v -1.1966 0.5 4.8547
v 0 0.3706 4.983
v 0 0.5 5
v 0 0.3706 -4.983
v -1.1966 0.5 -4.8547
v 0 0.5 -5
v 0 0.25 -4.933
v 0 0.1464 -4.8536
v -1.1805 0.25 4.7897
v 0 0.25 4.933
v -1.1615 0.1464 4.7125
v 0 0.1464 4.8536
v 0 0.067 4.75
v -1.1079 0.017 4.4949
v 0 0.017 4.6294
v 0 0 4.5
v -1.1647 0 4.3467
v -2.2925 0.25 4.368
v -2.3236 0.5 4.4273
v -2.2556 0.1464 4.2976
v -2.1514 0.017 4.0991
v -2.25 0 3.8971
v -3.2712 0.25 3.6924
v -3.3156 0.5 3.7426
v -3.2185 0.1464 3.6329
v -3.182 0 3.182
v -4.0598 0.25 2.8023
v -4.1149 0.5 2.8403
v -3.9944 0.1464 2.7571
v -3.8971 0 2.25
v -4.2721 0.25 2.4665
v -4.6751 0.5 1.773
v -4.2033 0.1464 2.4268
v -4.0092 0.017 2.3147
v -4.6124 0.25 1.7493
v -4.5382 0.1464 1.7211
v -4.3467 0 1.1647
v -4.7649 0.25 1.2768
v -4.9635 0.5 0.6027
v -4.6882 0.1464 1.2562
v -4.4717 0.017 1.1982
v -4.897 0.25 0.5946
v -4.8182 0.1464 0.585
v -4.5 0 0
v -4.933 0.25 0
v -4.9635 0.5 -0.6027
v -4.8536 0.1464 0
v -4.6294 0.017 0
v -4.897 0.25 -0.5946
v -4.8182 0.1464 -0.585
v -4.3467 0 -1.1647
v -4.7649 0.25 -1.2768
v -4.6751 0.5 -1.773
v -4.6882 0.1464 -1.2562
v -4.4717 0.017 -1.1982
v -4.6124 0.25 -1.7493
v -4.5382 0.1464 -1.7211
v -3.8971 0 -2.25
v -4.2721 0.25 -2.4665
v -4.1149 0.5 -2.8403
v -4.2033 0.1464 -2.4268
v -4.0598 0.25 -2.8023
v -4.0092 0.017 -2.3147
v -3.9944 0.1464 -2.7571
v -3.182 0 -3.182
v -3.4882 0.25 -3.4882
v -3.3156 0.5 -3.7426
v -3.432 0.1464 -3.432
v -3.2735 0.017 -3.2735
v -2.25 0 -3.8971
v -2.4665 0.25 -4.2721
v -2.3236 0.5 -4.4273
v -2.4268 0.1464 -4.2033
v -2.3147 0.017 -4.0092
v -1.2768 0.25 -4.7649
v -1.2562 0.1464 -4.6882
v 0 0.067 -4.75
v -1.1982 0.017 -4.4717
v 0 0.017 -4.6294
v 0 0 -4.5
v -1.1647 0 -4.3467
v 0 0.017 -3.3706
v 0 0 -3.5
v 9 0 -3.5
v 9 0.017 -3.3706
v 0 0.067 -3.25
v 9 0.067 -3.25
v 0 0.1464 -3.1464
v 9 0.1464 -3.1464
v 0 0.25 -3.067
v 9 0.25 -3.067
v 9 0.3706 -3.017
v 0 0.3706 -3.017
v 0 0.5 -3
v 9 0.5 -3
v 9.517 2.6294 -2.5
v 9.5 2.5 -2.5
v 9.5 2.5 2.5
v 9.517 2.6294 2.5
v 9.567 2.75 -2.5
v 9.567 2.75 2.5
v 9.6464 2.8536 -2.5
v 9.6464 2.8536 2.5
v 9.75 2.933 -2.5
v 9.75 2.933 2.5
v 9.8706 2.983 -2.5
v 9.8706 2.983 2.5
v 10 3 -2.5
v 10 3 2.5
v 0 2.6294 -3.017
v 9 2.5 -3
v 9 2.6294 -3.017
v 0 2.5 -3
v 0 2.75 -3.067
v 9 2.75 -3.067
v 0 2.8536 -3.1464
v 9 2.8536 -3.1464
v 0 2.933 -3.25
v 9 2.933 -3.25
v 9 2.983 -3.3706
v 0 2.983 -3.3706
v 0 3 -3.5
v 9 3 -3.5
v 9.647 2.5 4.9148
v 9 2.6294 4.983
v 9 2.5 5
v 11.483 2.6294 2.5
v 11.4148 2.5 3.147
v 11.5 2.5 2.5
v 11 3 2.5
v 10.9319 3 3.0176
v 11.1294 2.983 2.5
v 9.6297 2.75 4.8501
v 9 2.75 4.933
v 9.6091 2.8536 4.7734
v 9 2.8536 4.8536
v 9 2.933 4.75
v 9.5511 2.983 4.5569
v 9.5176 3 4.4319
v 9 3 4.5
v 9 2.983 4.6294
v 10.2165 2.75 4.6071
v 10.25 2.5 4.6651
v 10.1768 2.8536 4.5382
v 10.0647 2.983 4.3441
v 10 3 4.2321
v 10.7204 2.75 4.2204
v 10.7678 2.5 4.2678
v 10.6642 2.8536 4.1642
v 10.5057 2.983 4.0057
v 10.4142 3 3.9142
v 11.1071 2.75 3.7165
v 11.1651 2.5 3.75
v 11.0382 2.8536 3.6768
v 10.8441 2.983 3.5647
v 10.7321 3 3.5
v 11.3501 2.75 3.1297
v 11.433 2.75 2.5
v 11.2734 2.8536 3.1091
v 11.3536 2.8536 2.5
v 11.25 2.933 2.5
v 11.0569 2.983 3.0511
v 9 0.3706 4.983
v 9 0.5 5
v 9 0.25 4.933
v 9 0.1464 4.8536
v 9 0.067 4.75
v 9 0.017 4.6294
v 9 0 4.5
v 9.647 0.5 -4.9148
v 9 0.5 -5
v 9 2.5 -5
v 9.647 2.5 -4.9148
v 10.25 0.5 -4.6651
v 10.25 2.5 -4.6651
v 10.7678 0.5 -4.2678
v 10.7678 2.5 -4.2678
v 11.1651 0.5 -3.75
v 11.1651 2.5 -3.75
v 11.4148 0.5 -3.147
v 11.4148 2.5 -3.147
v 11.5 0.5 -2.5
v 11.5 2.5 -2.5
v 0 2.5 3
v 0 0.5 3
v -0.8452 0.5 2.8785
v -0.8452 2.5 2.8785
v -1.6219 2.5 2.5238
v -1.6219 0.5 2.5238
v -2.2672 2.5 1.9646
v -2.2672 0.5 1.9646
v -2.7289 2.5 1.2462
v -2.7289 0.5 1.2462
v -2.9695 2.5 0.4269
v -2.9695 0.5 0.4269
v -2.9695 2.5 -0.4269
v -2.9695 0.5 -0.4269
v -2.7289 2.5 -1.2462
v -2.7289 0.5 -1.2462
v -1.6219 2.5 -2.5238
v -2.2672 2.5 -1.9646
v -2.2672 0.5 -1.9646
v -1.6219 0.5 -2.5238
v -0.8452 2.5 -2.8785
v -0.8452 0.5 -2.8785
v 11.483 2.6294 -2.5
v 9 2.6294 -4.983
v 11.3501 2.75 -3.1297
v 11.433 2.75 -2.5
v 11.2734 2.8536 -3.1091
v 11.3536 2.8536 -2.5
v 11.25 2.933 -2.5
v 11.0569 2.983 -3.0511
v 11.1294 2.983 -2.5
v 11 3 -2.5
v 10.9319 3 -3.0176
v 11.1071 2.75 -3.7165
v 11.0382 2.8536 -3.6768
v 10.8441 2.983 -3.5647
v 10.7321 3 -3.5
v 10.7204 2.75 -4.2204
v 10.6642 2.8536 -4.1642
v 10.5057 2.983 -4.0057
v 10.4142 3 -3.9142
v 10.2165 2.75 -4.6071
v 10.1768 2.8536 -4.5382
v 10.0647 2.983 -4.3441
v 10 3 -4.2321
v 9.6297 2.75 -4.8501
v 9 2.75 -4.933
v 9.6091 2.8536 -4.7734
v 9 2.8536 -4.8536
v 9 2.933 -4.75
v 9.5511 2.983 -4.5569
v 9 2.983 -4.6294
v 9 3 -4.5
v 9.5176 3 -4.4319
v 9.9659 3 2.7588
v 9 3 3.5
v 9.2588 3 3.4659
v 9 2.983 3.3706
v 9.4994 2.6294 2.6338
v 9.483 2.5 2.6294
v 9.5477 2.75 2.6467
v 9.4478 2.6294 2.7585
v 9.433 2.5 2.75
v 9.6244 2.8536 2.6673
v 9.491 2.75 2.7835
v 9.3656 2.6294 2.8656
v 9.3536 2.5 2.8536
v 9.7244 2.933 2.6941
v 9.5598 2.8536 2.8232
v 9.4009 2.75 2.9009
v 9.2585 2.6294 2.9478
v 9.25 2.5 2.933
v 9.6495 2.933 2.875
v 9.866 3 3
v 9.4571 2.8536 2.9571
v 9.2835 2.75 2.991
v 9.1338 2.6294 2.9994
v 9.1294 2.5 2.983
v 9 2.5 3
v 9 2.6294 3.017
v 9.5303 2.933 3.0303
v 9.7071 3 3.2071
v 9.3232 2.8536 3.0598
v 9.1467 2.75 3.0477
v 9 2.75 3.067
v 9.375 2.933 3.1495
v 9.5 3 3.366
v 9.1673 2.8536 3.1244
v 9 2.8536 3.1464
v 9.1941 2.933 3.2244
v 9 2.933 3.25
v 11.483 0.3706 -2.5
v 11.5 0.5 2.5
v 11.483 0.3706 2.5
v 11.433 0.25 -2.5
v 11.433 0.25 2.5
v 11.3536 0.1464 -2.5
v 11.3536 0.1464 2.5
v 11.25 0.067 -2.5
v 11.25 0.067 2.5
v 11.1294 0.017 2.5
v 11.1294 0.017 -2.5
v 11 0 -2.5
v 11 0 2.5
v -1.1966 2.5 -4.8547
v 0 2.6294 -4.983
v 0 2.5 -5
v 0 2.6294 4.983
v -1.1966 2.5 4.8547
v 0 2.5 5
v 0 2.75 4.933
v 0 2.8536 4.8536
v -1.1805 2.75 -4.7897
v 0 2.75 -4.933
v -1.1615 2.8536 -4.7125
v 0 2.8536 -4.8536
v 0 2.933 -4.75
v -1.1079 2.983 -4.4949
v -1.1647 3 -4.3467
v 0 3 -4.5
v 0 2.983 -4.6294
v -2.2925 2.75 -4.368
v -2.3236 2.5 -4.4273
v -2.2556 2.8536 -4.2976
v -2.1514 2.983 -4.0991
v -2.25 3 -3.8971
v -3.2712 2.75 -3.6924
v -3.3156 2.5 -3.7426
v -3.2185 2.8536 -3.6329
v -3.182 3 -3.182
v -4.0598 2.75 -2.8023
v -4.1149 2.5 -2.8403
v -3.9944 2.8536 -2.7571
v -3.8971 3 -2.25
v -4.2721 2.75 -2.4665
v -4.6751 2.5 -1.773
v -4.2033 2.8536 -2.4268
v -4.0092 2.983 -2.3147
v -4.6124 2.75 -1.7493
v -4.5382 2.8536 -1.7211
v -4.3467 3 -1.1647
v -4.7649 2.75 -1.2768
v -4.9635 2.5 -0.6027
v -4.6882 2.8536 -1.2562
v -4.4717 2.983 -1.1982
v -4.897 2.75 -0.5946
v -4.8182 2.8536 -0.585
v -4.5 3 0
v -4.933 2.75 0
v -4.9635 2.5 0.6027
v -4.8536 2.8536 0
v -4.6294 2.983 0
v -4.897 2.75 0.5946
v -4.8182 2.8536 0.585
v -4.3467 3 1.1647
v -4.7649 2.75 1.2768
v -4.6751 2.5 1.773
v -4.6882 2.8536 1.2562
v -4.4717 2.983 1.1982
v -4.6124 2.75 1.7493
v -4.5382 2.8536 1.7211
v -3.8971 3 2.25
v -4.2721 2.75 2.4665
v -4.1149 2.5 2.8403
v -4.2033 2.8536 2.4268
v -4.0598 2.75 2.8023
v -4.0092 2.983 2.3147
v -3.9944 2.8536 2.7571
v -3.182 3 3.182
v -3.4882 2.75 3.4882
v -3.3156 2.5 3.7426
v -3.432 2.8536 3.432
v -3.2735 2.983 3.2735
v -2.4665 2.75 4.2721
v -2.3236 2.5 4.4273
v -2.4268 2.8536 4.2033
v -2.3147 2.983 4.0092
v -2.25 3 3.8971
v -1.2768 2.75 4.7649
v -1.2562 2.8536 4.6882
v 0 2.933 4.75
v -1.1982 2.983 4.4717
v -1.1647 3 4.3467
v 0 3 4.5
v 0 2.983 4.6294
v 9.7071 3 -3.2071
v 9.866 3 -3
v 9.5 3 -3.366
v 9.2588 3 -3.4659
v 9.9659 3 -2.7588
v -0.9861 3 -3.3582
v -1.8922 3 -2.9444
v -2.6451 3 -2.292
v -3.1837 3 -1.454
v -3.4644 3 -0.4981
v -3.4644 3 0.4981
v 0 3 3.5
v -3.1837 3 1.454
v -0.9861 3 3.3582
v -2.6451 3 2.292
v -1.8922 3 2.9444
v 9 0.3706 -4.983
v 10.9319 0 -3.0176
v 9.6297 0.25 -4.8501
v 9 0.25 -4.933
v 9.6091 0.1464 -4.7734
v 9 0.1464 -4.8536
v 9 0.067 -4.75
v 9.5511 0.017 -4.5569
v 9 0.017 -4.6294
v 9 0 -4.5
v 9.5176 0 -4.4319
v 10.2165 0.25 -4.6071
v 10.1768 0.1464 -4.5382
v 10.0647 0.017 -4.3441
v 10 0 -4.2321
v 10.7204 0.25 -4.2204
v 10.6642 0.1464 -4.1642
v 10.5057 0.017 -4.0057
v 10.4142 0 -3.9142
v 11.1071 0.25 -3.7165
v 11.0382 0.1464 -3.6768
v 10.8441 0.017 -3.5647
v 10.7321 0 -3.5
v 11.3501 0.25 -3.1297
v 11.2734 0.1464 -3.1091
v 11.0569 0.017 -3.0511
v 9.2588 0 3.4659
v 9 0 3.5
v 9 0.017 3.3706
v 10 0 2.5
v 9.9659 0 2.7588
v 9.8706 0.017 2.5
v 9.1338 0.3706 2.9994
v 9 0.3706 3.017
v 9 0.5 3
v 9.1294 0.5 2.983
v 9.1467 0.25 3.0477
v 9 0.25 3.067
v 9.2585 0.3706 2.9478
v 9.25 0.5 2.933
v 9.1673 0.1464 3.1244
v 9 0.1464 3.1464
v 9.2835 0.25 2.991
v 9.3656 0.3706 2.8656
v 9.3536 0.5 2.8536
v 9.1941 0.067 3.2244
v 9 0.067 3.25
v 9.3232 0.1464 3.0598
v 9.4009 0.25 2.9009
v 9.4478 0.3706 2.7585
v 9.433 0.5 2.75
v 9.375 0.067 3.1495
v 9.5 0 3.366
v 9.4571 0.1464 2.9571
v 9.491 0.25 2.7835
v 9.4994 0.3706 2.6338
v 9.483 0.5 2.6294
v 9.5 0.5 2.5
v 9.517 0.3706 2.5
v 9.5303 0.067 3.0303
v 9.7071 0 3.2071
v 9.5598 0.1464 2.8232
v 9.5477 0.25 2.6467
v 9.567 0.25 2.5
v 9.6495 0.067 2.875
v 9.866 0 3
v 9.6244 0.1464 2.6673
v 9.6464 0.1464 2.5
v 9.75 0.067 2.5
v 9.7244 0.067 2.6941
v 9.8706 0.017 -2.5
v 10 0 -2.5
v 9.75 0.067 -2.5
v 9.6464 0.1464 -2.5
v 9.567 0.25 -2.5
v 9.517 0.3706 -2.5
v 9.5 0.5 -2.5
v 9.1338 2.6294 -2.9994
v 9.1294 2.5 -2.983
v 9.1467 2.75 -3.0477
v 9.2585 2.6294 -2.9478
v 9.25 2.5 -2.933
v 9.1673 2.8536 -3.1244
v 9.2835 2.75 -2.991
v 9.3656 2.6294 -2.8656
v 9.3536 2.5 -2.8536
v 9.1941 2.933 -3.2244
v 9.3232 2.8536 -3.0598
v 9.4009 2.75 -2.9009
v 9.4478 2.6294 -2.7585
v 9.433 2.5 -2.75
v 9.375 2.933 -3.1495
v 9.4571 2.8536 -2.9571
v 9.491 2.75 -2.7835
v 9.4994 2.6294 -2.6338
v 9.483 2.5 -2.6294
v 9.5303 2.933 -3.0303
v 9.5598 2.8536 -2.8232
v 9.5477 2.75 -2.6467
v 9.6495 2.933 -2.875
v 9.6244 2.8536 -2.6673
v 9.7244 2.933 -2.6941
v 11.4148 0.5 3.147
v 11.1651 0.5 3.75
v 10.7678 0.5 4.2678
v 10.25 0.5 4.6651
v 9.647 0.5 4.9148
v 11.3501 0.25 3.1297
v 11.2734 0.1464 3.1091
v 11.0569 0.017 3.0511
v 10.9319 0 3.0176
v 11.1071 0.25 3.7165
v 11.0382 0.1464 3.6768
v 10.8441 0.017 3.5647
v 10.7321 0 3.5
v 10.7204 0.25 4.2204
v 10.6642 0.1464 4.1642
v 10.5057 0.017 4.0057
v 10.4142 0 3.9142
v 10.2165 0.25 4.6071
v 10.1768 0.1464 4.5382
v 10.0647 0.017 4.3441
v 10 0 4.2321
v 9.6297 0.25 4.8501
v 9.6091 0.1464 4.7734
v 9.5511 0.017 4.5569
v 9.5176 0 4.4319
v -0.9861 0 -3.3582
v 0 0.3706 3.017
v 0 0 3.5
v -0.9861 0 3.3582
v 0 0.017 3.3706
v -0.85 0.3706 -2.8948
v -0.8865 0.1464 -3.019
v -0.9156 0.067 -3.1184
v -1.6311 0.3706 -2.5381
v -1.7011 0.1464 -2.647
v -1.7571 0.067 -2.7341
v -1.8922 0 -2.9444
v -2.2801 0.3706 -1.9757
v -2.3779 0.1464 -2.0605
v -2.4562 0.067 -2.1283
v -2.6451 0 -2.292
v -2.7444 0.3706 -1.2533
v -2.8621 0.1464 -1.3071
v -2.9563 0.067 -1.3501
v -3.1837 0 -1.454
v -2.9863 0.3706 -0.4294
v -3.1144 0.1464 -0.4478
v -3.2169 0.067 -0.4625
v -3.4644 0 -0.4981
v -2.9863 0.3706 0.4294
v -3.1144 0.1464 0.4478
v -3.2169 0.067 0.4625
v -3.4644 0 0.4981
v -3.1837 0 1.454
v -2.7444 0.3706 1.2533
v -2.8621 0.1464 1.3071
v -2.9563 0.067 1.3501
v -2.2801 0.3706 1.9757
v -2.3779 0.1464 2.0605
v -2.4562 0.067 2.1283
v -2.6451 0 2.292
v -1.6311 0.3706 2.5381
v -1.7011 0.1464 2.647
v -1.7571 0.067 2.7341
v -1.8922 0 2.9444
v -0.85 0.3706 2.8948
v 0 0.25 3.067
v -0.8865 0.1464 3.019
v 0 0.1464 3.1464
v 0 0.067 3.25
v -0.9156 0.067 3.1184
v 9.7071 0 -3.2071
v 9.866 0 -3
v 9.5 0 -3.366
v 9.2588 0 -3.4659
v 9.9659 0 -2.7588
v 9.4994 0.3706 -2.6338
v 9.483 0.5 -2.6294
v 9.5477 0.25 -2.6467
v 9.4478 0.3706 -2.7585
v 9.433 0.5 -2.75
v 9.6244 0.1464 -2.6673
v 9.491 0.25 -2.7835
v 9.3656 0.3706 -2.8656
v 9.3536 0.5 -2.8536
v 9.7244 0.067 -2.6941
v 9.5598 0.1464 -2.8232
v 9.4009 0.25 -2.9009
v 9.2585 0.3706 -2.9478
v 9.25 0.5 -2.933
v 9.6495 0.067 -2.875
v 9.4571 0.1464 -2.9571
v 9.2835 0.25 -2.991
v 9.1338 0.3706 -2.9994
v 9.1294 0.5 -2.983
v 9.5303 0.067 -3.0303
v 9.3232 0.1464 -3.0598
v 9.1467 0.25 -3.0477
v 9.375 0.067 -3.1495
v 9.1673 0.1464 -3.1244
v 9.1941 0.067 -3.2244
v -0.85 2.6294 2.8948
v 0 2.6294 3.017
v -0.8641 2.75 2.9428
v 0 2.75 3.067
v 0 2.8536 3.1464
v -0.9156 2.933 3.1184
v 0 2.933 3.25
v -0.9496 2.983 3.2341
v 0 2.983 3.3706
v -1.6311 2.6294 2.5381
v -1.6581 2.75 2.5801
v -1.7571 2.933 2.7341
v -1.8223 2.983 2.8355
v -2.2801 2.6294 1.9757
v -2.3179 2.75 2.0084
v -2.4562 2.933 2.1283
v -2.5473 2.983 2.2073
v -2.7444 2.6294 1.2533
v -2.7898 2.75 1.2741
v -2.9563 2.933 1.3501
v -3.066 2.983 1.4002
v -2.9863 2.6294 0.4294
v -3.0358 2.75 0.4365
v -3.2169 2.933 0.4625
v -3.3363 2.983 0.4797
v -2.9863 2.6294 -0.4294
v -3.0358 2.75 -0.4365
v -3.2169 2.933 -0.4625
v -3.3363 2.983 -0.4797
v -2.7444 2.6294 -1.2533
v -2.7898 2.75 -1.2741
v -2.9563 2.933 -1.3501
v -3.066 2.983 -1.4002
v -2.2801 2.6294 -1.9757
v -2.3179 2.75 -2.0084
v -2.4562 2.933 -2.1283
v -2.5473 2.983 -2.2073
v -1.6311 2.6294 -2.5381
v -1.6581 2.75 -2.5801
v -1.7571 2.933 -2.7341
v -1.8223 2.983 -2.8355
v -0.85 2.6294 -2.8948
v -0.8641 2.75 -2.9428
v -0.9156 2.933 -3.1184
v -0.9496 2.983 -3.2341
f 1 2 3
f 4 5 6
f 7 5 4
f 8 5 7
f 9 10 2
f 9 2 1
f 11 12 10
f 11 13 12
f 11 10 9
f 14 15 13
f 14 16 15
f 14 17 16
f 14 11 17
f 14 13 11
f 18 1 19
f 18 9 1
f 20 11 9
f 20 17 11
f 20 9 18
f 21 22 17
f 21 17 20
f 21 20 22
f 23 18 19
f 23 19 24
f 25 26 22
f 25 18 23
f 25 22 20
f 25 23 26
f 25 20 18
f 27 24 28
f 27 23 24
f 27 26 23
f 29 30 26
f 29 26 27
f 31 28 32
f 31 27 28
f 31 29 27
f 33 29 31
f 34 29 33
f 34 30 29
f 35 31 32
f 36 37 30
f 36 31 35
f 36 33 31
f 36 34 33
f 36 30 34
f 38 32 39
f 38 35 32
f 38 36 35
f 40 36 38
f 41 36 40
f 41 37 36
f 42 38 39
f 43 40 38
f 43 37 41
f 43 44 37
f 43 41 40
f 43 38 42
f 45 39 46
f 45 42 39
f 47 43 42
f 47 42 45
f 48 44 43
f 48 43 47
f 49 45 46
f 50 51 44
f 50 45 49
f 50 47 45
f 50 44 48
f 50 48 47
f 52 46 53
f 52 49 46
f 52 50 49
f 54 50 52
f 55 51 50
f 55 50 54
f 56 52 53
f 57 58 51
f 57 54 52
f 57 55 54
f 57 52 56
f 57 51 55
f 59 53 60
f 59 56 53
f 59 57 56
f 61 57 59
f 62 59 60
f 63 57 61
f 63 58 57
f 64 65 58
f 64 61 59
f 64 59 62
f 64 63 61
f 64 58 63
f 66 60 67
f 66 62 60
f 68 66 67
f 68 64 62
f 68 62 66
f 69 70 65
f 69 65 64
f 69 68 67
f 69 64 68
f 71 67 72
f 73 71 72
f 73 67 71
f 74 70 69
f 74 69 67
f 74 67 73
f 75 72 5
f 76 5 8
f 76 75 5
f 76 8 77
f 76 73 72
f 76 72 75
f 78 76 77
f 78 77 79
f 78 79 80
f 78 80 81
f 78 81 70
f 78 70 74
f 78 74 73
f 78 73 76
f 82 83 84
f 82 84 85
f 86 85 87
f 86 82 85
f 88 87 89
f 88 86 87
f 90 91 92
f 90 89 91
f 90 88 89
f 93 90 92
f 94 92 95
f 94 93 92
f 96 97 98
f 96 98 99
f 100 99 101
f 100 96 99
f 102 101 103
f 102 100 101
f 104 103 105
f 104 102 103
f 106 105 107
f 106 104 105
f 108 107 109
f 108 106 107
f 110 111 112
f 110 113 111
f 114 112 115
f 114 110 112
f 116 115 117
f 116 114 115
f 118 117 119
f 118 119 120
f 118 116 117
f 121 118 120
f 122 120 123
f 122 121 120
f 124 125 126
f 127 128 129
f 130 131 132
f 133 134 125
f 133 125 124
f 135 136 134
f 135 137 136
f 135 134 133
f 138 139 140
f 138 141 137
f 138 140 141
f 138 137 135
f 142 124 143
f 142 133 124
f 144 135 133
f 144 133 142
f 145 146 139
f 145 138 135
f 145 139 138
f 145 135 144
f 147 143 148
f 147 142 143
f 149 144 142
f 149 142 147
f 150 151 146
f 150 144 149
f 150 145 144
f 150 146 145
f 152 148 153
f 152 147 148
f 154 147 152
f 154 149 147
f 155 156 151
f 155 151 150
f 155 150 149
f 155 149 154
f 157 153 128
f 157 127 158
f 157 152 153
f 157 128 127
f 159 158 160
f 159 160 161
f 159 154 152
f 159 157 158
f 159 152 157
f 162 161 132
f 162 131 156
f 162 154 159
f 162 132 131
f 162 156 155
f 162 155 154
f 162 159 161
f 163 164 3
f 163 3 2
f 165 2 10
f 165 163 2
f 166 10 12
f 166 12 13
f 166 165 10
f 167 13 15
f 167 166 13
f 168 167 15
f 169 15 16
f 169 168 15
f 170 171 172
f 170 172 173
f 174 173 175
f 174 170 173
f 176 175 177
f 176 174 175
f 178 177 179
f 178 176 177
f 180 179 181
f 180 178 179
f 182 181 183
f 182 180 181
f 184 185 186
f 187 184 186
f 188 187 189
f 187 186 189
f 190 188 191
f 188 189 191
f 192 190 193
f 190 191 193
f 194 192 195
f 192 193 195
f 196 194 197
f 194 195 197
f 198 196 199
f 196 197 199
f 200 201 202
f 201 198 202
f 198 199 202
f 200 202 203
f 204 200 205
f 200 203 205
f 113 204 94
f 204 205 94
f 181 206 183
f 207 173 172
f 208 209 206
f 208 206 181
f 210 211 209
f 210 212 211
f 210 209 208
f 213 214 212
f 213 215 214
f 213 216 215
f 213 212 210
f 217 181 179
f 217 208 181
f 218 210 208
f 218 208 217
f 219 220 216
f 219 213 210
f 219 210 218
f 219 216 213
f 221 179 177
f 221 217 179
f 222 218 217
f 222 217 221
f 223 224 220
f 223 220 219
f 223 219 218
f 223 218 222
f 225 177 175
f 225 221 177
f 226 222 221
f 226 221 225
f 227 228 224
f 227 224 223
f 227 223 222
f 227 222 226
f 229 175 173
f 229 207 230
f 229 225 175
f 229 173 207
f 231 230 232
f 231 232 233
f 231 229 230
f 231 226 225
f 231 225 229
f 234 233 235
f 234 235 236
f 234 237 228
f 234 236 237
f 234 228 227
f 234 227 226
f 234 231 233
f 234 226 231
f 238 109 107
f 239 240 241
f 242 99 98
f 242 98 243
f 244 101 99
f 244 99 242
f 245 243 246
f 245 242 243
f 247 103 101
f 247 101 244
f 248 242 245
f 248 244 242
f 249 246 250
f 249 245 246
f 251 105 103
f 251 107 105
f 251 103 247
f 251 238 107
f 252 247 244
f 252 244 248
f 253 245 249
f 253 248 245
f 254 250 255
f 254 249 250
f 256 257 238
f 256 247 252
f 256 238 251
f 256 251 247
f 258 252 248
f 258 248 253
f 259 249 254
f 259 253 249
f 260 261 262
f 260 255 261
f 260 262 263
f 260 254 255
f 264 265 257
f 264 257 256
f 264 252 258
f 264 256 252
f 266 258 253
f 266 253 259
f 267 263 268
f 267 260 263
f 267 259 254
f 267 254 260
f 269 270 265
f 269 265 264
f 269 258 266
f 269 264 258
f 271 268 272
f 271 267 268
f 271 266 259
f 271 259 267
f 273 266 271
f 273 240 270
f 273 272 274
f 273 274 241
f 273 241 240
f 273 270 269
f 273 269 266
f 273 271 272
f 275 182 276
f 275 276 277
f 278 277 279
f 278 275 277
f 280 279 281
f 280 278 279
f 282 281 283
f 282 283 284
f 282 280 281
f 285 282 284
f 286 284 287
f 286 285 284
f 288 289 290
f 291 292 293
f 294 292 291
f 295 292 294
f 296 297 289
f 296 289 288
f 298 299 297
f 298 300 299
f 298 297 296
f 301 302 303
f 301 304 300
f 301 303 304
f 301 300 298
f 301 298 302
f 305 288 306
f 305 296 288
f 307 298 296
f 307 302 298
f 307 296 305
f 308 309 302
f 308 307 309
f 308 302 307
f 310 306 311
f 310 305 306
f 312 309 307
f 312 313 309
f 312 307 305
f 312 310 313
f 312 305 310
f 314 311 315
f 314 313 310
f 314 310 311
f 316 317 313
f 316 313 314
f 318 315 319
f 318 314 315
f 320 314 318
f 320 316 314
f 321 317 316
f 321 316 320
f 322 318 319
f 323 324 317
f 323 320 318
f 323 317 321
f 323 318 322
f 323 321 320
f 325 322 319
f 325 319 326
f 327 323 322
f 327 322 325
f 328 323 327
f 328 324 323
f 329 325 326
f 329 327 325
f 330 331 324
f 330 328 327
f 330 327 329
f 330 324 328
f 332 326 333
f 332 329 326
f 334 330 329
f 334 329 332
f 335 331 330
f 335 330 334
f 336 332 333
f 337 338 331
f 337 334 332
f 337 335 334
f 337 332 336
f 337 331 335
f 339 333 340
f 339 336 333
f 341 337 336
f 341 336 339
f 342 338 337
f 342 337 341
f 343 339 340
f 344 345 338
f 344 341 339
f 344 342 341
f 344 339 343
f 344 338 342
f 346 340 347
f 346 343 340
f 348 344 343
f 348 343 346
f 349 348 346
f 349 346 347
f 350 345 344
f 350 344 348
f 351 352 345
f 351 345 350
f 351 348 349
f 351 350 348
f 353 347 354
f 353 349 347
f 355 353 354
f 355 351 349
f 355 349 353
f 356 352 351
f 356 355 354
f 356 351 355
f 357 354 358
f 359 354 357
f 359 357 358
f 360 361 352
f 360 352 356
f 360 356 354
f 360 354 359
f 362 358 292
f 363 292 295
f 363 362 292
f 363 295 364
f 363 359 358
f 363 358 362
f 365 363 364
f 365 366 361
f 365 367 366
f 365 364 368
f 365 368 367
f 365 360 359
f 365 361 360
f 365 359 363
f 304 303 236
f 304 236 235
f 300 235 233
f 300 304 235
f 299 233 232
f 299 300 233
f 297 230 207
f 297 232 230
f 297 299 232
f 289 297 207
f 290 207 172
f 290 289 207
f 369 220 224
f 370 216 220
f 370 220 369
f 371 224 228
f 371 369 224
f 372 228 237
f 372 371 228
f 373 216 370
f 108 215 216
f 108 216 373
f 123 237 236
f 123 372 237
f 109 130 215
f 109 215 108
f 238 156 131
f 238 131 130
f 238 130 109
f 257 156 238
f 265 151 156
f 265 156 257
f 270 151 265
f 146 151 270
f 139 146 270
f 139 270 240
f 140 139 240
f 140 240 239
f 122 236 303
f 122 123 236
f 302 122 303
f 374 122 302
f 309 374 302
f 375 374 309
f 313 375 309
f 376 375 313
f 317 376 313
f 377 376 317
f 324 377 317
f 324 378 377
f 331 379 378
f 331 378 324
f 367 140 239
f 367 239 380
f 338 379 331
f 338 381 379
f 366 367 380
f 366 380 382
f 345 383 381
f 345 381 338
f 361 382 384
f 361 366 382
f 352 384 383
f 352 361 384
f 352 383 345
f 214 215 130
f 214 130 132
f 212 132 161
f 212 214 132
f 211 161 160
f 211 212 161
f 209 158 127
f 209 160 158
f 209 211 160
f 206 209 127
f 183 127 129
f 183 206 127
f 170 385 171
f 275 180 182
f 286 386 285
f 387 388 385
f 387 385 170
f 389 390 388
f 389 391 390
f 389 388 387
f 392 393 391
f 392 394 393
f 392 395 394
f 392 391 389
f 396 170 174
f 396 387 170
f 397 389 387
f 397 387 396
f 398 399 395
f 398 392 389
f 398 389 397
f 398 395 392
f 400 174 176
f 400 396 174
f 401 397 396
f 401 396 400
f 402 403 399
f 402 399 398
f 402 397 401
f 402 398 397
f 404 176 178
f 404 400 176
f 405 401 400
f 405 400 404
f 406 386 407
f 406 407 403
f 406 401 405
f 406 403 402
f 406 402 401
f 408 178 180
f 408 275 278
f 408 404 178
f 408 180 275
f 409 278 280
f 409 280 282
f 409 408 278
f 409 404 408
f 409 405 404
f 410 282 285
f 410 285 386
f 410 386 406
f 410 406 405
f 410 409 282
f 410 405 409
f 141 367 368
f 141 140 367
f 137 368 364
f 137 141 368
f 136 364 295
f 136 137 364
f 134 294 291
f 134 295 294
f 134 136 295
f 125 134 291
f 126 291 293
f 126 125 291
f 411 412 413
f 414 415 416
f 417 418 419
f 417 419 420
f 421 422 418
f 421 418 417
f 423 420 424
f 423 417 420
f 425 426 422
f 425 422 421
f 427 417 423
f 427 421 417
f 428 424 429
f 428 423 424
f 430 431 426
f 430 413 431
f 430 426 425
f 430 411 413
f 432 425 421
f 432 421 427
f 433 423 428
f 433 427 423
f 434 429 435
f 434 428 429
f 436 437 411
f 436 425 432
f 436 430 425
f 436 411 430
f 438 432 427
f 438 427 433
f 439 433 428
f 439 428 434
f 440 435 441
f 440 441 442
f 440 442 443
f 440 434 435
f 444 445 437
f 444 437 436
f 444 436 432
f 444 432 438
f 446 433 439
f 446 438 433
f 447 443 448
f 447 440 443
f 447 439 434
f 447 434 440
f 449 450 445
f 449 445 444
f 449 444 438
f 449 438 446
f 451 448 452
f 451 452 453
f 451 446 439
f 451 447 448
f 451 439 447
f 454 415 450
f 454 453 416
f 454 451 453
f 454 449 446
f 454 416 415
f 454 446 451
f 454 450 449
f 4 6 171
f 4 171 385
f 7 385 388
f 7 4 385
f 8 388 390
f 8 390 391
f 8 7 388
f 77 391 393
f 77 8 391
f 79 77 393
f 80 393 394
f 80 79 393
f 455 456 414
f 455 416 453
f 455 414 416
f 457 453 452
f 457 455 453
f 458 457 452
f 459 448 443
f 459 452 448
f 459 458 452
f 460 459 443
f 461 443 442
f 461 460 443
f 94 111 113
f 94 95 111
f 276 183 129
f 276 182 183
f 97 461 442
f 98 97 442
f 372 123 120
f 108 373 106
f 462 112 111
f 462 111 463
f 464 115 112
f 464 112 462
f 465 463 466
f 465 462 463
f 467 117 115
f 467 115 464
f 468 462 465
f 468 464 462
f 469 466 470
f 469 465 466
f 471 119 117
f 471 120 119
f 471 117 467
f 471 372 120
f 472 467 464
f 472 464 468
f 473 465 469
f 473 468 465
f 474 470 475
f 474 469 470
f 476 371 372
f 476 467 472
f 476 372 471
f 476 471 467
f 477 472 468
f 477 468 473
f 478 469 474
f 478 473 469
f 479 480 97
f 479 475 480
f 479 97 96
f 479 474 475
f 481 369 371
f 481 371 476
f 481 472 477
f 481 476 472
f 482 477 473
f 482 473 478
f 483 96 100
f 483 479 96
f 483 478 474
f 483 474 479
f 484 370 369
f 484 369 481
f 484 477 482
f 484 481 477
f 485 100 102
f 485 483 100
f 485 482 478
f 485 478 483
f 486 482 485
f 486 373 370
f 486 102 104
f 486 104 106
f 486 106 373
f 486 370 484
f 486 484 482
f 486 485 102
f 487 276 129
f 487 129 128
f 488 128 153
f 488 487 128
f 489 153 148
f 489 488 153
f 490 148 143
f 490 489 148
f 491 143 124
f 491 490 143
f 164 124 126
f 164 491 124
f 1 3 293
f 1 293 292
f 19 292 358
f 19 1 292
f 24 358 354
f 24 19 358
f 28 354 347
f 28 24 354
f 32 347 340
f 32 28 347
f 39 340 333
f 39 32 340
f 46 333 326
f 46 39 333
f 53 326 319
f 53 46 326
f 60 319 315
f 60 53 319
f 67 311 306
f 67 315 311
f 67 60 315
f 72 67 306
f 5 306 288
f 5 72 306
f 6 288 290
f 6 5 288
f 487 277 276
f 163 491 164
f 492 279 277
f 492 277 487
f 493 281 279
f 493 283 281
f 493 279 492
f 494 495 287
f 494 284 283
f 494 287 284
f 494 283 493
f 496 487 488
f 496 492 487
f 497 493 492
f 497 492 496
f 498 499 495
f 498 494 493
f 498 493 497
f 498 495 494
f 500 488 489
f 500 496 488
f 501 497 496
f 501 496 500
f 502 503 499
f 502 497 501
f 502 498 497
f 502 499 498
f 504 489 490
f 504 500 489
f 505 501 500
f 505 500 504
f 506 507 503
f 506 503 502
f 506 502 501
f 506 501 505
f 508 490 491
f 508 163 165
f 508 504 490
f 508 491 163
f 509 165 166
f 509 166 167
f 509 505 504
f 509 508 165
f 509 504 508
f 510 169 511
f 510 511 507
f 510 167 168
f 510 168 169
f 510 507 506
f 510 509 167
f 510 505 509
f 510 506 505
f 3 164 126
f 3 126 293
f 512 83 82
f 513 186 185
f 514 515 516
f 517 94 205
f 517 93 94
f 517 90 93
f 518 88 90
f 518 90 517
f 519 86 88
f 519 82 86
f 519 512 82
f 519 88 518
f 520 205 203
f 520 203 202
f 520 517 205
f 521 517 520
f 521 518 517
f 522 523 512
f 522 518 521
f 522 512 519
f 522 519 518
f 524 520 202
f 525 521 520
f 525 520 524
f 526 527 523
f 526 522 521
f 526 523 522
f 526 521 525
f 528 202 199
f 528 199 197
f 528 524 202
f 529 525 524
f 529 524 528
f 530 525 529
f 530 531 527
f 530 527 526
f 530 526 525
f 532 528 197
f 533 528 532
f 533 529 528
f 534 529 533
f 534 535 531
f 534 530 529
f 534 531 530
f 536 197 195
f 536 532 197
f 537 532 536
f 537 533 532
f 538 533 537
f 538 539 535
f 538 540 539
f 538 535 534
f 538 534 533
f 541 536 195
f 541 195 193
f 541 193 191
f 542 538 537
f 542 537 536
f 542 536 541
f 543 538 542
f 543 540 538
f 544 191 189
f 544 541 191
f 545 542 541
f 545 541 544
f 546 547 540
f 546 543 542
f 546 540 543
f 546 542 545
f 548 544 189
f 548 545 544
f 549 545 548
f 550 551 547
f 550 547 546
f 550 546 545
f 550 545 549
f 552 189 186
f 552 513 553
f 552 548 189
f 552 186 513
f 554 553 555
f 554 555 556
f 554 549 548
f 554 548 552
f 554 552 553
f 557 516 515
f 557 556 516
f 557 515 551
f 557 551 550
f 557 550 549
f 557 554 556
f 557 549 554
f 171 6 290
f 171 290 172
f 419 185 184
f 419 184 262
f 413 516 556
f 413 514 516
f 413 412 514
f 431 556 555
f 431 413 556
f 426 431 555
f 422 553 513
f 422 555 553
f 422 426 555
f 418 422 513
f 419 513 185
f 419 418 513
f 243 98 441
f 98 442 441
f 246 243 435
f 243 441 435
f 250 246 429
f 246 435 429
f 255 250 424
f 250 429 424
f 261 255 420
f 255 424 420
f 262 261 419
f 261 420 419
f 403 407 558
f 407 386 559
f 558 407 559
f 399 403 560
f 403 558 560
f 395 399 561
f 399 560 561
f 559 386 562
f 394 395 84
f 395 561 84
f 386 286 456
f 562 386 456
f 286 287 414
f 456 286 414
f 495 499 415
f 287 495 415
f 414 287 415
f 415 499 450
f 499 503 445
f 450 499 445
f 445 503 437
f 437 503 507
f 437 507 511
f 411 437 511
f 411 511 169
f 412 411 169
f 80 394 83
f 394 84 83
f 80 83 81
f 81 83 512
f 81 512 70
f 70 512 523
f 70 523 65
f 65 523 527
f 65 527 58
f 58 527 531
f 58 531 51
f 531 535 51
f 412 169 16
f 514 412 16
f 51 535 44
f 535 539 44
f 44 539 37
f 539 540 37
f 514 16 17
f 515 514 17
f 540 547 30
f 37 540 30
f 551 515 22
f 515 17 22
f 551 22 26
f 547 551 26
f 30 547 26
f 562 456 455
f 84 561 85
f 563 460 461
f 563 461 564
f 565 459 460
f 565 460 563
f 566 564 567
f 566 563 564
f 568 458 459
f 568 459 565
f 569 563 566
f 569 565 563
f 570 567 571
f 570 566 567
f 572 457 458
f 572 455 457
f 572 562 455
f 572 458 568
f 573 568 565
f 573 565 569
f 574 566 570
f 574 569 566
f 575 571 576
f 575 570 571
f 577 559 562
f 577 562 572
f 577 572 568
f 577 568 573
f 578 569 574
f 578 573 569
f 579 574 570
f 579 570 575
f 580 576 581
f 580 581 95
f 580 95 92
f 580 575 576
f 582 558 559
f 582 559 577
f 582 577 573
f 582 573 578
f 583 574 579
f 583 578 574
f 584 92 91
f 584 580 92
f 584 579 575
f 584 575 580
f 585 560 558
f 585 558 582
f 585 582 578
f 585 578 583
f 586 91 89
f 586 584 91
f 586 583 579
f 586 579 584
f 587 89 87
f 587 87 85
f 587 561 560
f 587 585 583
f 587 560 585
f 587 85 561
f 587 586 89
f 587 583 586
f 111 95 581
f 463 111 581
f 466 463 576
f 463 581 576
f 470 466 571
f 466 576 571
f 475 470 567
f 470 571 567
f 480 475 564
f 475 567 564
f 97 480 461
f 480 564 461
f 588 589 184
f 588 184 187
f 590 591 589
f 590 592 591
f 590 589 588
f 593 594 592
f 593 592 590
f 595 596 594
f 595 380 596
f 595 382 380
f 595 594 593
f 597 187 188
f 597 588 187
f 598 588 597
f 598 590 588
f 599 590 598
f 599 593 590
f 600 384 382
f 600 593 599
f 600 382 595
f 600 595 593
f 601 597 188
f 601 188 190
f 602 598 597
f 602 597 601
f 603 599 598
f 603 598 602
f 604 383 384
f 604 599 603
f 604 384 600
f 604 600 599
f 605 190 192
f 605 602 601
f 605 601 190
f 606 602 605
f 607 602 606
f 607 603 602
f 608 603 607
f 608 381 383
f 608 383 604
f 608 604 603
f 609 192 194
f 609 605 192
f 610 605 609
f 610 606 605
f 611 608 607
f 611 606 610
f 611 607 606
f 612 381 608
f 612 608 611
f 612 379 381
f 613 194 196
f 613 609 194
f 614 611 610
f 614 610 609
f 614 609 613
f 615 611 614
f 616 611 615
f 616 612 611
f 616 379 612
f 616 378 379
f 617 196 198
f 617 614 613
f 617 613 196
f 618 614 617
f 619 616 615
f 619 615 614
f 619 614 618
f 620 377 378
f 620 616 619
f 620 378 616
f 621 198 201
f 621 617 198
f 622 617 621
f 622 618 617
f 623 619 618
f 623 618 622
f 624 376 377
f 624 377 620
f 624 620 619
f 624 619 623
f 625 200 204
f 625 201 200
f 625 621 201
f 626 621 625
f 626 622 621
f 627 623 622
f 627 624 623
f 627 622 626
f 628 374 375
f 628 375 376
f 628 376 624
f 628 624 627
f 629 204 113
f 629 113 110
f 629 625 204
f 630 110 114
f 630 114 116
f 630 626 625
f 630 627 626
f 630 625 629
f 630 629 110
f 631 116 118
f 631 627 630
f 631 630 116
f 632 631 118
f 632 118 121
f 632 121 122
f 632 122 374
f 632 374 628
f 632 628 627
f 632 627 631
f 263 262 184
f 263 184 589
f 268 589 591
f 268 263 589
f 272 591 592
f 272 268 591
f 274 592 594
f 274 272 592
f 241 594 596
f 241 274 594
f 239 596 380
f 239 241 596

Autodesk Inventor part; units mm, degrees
ref_plane "YZ Plane" through (0, 0, 0) normal (1, 0, 0) x (0, 1, 0)
ref_plane "XZ Plane" through (0, 0, 0) normal (0, 1, 0) x (-1, 0, 0)
ref_plane "XY Plane" through (0, 0, 0) normal (0, 0, 1) x (1, 0, 0)
sketch "Sketch1" plane through (0, 0, 0) normal (0, 1, 0) x (-1, 0, 0)
  line L0 (-9, -3) -> (0, -3)
  arc A0 (0, -3) -> (0, 3) centre (0, 0) ccw
  line L1 (0, 3) -> (-9, 3)
  arc A1 (-9.5, -2.5) -> (-9, -3) centre (-9, -2.5) ccw
  line L2 (-9.5, -2.5) -> (-9.5, 2.5)
  arc A2 (-9, 3) -> (-9.5, 2.5) centre (-9, 2.5) ccw
  line L3 (0, -5) -> (-9, -5)
  arc A3 (-11.5, -2.5) -> (-9, -5) centre (-9, -2.5) ccw
  line L4 (-11.5, -2.5) -> (-11.5, 2.5)
  arc A4 (-9, 5) -> (-11.5, 2.5) centre (-9, 2.5) ccw
  line L5 (-9, 5) -> (0, 5)
  arc A5 (0, -5) -> (0, 5) centre (0, 0) ccw
  dimension "d0" = 3
  dimension "d1" = 0.5
  dimension "d2" = 9.5
  dimension "d3" = 2
extrude "Extrusion1" add sketch "Sketch1" along normal blind 3
fillet "Fillet1" radius 0.5 24 edges at (10.7678, 3, 4.2678) (11.5, 3, 0) (10.7678, 3, -4.2678) (4.5, 3, -5) (-5, 3, 0) (4.5, 3, 5) (-3, 3, 0) (4.5, 3, -3) (9.3536, 3, -2.8536) (9.5, 3, 0) (9.3536, 3, 2.8536) (4.5, 3, 3) (-3, 0, 0) (4.5, 0, 3) (9.3536, 0, 2.8536) (9.5, 0, 0) (9.3536, 0, -2.8536) (4.5, 0, -3) (10.7678, 0, -4.2678) (11.5, 0, 0) (10.7678, 0, 4.2678) (4.5, 0, 5) (-5, 0, 0) (4.5, 0, -5)
properties part number "x_iddler_cap_zip_tie" material "ABS Plastic"
